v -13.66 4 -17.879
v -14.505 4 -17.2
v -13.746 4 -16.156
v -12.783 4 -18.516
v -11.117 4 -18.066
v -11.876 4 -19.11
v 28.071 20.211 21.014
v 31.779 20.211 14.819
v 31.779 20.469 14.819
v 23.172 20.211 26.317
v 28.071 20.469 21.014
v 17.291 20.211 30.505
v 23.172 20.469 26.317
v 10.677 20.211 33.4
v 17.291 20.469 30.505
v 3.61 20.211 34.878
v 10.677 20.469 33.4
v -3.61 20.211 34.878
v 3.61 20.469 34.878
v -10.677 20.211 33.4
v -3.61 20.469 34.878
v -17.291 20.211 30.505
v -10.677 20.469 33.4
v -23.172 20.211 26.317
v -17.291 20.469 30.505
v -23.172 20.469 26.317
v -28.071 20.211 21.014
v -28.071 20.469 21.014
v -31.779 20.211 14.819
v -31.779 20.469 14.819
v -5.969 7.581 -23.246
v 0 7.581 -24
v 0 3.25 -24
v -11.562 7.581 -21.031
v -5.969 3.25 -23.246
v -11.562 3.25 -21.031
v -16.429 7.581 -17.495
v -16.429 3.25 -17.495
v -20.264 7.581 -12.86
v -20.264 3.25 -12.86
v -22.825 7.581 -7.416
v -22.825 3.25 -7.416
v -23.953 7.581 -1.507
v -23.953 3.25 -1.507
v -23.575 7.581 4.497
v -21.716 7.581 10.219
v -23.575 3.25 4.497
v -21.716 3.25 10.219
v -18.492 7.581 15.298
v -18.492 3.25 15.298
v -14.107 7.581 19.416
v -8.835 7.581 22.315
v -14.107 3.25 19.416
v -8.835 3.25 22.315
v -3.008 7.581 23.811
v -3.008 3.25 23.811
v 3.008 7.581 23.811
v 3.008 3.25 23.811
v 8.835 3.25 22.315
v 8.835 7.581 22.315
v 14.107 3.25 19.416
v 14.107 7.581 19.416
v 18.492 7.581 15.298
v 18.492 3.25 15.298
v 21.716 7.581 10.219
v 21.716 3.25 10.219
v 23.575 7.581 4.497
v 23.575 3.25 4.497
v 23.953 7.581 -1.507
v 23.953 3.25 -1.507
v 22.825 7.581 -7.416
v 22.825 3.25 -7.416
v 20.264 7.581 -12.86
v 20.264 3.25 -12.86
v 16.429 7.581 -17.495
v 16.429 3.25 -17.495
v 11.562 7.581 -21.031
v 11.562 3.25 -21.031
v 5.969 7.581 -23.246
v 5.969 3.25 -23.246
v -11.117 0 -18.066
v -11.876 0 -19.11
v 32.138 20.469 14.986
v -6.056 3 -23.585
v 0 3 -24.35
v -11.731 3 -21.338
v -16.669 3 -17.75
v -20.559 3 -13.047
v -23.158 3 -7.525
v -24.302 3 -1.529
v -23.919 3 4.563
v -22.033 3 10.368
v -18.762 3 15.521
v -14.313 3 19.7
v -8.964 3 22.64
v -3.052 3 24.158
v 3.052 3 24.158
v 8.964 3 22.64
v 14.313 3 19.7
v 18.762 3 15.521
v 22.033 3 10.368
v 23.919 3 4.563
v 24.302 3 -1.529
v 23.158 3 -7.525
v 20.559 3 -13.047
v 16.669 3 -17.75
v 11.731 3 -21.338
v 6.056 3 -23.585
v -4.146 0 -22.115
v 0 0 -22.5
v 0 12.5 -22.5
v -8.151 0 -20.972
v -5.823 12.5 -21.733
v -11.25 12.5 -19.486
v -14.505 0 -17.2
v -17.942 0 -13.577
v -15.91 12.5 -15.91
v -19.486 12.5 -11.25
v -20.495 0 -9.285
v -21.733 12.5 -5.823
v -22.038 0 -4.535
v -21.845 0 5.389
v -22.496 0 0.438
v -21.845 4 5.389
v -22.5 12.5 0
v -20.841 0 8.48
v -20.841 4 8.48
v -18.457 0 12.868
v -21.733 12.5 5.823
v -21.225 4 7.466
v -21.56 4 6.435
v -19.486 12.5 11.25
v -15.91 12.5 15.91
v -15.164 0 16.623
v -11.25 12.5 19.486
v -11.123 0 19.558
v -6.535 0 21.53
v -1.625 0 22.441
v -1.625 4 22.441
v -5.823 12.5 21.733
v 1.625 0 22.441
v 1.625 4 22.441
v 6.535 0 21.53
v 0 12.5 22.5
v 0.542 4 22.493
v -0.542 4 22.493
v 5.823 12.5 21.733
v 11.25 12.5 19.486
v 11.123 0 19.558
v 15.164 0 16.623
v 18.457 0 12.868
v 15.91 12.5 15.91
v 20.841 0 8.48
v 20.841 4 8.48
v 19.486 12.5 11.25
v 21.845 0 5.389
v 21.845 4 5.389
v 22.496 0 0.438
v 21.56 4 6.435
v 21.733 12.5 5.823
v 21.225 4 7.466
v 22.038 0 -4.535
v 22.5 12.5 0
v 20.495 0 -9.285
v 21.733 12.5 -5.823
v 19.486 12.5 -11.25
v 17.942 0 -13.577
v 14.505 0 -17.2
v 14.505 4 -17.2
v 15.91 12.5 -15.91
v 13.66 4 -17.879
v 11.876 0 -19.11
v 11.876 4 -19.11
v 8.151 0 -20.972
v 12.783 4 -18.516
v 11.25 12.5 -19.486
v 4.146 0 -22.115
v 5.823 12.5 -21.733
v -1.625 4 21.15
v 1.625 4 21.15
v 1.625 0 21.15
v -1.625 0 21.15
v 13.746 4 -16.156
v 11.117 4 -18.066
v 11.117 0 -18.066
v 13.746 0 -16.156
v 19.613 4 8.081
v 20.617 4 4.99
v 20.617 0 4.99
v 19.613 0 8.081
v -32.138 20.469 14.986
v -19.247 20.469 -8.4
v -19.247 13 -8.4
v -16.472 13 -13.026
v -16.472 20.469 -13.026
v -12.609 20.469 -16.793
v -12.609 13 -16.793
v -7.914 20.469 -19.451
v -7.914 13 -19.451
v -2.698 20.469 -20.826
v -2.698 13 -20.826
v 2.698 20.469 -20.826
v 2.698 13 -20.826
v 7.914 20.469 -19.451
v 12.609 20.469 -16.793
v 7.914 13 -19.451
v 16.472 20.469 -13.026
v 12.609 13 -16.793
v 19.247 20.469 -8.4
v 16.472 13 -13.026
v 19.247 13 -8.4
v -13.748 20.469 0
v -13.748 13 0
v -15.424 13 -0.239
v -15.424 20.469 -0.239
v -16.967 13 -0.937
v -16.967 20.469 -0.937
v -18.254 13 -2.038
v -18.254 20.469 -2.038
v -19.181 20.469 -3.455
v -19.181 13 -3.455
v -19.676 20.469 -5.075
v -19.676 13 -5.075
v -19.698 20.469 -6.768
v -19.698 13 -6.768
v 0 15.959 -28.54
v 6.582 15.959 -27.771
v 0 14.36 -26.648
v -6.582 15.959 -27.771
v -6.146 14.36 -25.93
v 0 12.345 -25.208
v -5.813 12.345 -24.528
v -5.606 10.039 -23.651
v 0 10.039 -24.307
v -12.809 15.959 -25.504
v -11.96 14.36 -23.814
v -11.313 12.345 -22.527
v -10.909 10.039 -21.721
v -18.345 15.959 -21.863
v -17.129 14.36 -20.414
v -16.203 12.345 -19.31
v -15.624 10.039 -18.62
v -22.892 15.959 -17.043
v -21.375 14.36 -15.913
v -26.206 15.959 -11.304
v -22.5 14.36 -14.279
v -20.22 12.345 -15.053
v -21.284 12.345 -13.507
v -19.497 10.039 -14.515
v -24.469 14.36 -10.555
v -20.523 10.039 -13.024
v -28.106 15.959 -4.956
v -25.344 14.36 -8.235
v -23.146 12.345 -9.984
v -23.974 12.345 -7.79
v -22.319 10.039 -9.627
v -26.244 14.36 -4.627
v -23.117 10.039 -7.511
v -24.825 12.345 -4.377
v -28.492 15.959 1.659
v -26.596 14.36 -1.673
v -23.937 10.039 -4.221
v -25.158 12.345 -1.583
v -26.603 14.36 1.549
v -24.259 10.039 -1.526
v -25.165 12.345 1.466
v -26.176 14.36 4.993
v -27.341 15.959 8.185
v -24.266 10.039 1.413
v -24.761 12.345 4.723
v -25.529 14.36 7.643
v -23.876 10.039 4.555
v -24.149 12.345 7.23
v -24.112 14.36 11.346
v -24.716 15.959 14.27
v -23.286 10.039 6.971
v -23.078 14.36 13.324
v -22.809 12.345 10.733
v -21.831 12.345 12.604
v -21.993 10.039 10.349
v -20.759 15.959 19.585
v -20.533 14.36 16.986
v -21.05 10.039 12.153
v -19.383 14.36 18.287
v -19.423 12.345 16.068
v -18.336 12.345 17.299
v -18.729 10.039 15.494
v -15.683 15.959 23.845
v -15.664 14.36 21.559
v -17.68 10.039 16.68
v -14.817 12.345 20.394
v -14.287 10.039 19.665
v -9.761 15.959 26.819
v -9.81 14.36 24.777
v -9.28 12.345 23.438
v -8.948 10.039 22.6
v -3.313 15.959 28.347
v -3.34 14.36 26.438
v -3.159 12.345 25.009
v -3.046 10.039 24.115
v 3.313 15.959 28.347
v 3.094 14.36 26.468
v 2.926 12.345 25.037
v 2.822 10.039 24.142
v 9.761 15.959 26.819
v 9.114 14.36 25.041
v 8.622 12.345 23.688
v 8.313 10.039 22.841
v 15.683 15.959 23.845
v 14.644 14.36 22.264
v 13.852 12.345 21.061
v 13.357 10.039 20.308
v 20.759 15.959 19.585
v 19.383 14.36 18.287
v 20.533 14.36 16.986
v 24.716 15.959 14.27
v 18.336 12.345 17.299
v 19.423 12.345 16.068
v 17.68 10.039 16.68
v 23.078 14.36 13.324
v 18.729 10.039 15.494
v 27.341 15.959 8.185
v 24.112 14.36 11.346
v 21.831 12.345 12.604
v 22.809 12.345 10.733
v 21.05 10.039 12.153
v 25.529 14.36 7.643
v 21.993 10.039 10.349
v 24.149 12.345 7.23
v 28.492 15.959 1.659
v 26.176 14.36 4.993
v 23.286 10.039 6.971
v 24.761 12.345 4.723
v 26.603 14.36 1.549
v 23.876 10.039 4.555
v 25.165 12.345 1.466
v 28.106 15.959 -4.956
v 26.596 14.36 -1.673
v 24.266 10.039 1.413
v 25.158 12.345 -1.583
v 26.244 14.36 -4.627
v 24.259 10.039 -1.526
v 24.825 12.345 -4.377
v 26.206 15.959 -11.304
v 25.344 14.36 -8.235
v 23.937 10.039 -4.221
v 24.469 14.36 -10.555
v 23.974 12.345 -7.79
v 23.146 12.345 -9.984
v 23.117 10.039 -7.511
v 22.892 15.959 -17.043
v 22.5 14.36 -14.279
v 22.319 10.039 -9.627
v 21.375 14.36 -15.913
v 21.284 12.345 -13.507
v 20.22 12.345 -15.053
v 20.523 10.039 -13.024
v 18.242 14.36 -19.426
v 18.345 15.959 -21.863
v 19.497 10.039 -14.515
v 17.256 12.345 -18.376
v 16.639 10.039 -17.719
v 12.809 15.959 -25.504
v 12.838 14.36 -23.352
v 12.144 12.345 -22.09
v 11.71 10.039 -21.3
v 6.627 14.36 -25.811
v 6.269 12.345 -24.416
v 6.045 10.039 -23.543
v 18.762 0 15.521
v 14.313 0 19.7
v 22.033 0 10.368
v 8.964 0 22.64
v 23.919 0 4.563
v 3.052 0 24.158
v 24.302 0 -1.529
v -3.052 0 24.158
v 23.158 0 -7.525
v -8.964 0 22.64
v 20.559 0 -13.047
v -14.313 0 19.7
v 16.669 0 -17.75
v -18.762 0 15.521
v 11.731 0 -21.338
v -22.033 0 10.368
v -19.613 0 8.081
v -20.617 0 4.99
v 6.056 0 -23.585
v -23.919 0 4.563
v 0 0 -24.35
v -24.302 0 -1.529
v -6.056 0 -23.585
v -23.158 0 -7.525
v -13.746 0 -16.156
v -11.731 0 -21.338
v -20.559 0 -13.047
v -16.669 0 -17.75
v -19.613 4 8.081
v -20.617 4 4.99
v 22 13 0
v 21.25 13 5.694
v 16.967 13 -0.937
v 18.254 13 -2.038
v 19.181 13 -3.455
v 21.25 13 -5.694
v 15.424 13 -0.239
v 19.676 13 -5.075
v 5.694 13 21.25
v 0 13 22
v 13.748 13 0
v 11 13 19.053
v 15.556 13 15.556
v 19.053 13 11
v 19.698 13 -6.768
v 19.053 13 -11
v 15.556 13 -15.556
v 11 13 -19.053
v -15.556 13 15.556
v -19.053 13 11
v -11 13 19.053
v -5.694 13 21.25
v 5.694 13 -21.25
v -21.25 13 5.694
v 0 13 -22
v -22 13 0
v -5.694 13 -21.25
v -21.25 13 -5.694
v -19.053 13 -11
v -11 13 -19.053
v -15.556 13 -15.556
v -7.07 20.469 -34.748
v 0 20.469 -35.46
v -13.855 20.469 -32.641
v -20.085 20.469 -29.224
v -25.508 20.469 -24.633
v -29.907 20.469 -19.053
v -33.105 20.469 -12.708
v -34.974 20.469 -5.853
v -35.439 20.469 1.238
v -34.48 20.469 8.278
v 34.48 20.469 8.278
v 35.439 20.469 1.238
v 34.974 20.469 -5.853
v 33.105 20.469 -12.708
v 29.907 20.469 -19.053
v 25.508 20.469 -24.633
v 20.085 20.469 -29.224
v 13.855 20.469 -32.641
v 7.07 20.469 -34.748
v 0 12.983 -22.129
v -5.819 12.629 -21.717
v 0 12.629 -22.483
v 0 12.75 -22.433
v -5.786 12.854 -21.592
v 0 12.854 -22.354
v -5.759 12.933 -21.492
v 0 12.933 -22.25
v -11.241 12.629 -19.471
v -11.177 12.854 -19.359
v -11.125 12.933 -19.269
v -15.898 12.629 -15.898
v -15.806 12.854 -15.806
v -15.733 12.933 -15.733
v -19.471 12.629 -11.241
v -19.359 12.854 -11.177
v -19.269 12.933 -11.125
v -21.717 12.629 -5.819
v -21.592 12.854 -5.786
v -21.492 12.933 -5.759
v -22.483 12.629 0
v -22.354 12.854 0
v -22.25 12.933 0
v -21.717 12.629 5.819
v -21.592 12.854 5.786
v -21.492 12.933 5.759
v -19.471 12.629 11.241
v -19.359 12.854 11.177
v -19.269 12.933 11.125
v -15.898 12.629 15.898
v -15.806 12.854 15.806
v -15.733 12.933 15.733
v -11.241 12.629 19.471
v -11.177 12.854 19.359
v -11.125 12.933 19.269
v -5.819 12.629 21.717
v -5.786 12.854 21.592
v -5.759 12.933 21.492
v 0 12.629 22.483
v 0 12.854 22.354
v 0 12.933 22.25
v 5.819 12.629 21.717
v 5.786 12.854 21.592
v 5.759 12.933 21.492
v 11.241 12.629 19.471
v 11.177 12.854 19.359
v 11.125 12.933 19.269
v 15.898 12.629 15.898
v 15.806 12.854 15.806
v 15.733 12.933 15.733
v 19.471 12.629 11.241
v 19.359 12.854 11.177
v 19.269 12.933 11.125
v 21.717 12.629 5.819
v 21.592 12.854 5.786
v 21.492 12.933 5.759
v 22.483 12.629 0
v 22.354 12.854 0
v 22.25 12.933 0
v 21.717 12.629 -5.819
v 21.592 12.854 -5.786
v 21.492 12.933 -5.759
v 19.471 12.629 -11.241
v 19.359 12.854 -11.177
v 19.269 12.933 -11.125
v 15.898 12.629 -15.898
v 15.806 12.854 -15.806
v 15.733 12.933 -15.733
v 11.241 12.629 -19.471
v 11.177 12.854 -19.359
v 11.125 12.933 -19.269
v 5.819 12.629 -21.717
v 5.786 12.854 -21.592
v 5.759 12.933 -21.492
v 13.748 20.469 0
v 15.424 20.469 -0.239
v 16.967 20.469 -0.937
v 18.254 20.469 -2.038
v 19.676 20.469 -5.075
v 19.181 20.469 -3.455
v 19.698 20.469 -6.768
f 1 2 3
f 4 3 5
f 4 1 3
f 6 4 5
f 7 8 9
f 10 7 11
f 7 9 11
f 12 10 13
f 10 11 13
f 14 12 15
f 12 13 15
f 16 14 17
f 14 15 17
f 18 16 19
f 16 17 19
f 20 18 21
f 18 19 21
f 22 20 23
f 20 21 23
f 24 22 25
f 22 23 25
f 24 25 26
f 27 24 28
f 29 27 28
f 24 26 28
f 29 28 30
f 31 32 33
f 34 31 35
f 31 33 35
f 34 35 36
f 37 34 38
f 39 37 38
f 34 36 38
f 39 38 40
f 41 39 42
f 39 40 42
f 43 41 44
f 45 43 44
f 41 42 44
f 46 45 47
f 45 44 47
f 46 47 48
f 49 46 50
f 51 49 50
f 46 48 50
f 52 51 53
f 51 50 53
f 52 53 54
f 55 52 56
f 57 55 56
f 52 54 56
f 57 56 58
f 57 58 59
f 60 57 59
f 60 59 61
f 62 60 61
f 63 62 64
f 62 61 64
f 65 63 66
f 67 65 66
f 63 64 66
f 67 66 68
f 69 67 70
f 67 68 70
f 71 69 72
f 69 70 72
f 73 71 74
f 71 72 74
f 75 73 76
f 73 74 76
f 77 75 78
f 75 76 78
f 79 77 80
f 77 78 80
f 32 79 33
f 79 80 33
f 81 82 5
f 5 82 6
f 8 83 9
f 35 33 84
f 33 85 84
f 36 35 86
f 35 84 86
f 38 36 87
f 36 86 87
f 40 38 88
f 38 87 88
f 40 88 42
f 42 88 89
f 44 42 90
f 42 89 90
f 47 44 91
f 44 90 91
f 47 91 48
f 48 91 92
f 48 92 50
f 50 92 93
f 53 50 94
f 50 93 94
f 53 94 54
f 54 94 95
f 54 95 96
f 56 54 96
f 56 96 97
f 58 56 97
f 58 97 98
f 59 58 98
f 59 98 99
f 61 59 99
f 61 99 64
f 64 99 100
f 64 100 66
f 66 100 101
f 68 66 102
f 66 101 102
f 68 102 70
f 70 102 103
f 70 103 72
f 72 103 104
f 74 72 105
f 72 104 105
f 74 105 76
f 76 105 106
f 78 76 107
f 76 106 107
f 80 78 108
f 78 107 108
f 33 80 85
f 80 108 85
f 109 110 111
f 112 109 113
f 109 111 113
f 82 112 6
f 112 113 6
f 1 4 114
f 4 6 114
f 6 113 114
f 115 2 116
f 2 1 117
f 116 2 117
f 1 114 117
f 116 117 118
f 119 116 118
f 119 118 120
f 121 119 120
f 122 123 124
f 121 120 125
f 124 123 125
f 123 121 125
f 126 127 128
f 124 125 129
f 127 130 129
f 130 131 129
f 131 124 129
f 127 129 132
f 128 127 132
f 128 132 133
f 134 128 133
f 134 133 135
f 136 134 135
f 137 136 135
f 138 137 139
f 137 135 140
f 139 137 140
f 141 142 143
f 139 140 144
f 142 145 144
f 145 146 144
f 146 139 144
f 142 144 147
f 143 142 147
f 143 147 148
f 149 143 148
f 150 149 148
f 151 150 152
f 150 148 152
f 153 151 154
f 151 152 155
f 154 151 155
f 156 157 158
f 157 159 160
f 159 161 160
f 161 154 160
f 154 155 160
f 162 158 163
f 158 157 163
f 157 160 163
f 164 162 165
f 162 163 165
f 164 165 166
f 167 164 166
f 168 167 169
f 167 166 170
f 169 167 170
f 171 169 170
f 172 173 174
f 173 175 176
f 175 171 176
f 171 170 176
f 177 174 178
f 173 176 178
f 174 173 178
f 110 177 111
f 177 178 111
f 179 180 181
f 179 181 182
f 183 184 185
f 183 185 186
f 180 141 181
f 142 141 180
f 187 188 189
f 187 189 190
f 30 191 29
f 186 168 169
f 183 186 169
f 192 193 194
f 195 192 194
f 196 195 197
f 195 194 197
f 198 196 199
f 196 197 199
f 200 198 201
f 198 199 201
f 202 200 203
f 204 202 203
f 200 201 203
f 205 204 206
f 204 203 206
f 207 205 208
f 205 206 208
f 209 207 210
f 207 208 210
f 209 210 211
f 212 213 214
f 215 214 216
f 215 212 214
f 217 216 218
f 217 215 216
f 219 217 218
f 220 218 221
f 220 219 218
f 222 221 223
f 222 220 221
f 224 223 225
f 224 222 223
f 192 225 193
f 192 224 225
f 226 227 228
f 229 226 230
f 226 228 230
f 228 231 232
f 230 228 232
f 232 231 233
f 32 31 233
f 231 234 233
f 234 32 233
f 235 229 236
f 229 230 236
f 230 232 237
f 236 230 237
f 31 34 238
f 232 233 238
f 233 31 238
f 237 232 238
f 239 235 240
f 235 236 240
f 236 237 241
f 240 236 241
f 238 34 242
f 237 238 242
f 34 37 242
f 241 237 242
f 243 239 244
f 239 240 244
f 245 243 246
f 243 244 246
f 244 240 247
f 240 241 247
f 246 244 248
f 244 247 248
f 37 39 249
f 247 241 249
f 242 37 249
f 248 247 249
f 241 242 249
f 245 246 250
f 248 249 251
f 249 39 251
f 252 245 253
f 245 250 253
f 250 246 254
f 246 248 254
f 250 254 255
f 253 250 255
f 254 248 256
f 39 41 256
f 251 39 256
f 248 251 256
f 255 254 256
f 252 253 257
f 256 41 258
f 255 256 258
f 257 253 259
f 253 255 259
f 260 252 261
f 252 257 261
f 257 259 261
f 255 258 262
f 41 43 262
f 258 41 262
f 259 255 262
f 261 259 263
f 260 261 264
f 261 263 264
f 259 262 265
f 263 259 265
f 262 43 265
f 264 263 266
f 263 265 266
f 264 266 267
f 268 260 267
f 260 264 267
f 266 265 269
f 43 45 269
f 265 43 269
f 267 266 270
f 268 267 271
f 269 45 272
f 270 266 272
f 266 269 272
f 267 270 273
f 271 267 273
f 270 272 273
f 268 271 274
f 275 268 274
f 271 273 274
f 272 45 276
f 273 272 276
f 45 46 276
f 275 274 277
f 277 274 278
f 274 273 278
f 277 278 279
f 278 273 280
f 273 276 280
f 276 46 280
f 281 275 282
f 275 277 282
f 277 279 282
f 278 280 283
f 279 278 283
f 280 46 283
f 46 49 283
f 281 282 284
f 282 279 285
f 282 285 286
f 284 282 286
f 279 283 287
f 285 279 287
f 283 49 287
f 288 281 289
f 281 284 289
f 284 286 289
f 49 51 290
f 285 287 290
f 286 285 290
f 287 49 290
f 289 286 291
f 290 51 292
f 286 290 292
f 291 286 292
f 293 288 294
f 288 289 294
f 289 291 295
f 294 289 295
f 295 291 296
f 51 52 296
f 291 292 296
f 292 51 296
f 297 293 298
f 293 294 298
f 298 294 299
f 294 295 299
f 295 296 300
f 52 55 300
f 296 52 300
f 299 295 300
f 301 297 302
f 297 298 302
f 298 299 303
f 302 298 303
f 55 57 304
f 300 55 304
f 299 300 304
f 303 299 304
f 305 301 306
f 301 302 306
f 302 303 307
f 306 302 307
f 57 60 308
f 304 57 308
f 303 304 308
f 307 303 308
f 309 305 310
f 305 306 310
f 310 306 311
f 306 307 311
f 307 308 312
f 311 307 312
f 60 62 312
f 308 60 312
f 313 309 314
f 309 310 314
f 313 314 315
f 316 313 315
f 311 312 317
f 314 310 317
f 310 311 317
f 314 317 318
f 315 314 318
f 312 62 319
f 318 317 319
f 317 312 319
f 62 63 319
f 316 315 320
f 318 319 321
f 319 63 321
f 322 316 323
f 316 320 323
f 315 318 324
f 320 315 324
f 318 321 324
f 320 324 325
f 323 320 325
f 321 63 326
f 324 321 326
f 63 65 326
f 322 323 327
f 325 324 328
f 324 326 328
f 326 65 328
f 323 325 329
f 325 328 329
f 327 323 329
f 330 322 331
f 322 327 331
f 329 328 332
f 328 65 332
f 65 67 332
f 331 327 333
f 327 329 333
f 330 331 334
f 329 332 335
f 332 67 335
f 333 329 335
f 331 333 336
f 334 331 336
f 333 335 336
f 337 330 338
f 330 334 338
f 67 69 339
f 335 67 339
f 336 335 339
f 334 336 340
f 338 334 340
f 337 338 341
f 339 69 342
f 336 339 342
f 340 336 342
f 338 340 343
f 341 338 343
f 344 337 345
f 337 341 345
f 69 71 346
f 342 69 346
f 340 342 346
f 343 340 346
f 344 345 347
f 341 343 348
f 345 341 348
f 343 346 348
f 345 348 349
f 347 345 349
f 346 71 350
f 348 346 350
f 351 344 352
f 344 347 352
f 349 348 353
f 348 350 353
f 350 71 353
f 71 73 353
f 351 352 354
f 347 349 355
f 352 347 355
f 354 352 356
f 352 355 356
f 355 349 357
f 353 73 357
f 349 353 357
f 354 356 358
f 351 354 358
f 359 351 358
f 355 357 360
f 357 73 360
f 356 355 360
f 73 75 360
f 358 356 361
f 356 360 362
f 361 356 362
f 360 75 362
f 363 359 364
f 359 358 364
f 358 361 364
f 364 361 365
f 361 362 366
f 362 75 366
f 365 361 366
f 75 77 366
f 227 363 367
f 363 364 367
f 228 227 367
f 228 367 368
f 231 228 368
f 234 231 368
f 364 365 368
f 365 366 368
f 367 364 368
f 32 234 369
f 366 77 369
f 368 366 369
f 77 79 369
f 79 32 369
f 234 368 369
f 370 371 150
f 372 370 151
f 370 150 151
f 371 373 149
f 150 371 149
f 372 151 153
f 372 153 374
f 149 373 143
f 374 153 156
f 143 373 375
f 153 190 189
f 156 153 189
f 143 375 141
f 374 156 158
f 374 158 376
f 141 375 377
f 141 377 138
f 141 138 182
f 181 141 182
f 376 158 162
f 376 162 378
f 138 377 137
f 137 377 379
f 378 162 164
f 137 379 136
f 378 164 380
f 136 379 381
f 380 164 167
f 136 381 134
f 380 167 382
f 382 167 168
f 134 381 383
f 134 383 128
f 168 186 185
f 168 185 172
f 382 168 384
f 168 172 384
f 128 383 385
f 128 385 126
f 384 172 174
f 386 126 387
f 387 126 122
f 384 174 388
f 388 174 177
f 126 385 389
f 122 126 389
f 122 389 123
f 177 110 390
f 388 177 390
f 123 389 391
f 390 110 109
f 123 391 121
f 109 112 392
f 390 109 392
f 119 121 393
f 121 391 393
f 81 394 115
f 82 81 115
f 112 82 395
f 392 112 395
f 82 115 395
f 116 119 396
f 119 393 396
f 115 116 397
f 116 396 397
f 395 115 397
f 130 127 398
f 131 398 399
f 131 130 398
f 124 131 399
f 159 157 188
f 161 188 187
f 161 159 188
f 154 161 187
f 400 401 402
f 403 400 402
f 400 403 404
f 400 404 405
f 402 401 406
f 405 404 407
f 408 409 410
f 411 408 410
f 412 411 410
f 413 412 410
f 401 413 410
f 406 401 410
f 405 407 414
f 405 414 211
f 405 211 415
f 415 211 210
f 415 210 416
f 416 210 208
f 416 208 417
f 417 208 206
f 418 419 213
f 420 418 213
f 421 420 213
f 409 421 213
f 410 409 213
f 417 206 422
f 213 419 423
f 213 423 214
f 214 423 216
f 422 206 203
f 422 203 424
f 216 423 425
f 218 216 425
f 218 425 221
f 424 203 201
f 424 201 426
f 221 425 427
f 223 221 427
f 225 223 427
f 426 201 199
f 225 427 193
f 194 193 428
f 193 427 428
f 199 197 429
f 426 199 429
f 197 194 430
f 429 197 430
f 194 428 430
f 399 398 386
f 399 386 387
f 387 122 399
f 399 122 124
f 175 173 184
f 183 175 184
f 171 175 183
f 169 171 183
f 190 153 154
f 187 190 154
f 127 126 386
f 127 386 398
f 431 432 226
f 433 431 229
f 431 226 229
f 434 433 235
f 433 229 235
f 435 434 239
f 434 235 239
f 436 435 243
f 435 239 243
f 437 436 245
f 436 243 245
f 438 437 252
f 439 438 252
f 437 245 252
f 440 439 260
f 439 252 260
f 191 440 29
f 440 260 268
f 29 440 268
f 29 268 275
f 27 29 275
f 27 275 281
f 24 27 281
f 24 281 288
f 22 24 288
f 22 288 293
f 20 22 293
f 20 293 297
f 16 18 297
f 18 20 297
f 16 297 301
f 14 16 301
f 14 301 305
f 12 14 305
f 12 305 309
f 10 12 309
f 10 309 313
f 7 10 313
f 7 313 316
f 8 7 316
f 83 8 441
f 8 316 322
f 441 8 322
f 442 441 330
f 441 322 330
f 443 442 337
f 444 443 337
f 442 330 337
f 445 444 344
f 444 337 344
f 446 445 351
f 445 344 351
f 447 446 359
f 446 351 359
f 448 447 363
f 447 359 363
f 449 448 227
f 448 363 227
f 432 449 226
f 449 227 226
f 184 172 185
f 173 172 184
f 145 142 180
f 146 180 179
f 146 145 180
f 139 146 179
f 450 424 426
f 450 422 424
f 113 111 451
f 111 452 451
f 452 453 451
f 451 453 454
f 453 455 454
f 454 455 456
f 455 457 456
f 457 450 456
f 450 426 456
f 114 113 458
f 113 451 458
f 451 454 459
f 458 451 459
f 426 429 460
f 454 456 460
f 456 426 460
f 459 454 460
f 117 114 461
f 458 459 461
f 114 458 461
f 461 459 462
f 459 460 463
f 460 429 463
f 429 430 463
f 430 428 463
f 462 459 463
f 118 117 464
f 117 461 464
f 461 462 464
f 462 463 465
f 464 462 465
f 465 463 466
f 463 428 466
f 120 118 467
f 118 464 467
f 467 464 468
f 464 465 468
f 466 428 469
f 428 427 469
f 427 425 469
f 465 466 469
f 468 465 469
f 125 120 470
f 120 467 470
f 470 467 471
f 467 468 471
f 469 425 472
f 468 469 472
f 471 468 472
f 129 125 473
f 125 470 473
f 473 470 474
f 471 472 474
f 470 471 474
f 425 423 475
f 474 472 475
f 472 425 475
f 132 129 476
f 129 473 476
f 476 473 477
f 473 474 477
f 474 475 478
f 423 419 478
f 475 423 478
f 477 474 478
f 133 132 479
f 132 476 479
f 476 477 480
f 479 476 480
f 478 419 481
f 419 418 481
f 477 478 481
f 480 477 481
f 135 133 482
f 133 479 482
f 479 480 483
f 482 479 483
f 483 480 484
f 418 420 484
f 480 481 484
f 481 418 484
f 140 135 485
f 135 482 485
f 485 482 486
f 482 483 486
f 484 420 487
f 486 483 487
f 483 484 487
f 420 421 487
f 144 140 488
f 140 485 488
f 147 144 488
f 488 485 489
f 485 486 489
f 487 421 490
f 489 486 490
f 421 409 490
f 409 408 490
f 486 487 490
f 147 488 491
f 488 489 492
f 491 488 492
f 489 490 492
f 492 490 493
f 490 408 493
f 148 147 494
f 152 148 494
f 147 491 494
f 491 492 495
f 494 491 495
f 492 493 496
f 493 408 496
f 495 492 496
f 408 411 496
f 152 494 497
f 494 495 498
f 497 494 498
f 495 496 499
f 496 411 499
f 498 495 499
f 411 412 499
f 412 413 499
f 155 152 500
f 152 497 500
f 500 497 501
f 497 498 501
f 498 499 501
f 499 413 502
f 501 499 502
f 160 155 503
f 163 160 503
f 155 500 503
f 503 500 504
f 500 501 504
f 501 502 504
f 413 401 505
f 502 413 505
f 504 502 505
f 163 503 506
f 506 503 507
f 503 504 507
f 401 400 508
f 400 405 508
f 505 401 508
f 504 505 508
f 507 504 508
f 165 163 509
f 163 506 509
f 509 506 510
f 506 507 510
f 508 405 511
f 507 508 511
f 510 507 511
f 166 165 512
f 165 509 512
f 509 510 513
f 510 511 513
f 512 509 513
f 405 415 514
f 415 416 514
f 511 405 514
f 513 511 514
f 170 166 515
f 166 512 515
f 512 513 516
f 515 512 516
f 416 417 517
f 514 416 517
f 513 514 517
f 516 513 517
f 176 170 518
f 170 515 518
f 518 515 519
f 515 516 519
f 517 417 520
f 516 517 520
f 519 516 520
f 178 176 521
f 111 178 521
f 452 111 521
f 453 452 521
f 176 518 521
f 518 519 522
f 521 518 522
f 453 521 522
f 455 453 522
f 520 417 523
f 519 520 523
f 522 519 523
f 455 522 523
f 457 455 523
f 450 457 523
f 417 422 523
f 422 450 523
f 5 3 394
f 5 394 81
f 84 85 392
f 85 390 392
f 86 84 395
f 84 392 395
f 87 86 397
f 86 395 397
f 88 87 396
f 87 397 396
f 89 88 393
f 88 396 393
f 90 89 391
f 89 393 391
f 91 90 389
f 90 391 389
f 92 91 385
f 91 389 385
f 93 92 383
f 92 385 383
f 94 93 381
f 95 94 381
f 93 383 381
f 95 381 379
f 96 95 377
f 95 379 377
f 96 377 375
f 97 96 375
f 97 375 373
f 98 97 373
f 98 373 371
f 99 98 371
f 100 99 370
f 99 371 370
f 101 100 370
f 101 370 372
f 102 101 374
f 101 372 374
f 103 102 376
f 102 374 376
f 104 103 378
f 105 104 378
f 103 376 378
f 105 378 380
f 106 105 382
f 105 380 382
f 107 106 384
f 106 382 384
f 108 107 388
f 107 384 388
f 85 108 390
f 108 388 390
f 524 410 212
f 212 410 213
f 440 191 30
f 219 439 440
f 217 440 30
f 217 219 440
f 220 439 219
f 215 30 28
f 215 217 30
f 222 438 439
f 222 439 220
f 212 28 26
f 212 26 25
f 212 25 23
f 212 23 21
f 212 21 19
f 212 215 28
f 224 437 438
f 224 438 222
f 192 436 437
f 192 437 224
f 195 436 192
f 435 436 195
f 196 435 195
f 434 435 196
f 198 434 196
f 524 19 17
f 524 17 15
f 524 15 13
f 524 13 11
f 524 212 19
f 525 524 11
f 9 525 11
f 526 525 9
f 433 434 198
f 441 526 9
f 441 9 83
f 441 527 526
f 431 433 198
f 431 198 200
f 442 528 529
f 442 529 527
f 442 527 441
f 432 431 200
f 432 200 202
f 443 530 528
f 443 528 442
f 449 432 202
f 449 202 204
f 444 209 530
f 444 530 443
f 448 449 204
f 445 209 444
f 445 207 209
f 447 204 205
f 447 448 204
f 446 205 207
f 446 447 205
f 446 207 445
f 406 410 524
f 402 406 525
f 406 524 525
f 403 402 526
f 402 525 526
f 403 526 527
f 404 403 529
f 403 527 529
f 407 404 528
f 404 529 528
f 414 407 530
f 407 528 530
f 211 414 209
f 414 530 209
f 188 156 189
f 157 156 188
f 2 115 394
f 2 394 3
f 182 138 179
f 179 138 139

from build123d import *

# Parameters (mm, degrees)
CUT_EXTRUDE3_DEPTH           = 60
CUT_EXTRUDE5_DEPTH           = 2
CUT_EXTRUDE5_DEPTH_BACK      = 30
SKETCH9_R                    = 38
SKETCH9_R_2                  = 23
SKETCH19_W                   = 12
SKETCH19_H                   = 36.5
CUT_REVOLVE2_ANGLE           = 65
CUT_REVOLVE2_OTHER_WAY_ANGLE = 65
SKETCH21_W                   = 3.25
SKETCH21_H                   = 4
BOSS_EXTRUDE3_DEPTH          = 1.35
CIRPATTERN1_COUNT            = 5
CUT_EXTRUDE9_START           = -5
CUT_EXTRUDE9_DEPTH           = 5
SKETCH23_R                   = 10.5
CUT_EXTRUDE10_DEPTH          = 10
SKETCH24_W                   = 17
SKETCH24_H                   = 12
BOSS_EXTRUDE4_DEPTH          = 8
SKETCH26_W                   = 12
SKETCH26_H                   = 8
CUT_EXTRUDE11_DEPTH          = 10
SKETCH27_W                   = 4
SKETCH27_H                   = 5
CUT_EXTRUDE12_DEPTH          = 5
CUT_EXTRUDE14_DEPTH          = 2
CUT_EXTRUDE14_DEPTH_BACK     = 30
SKETCH29_R                   = 1
CUT_EXTRUDE15_DEPTH          = 15
FILLET1_R                    = 6
FILLET2_R                    = 8
SKETCH30_W                   = 97.703590575
SKETCH30_H                   = 5
CUT_EXTRUDE16_DEPTH          = 5
INTERSECT1_START             = 20.469057744
INTERSECT1_DEPTH             = 42.958818353


# Read off the part's stored shape, not the designer's step: Cut-Extrude9, Intersect1
with BuildPart() as part:
    # Sketch1 → Revolve1 (revolve)
    with BuildSketch(Plane.XY, mode=Mode.PRIVATE) as revolve1_sk:
        with BuildLine():
            Line((0, 63.427876097), (32, 63.427876097))
            ThreePointArc((32, 63.427876097), (37.656854249, 61.084730346), (40, 55.427876097))
            Line((40, 55.427876097), (40, 28.846818009))
            ThreePointArc((40, 28.846818009), (38.792081772, 24.082439968), (35.460140376, 20.469057744))
            Line((35.460140376, 20.469057744), (28.539859624, 15.958818353))
            ThreePointArc((28.539859624, 15.958818353), (25.207918228, 12.345436129), (24, 7.581058088))
            Line((24, 7.581058088), (24, 3.25))
            Line((24, 3.25), (24.35, 3))
            Line((24.35, 3), (24.35, 0))
            Line((24.35, 0), (22.5, 0))
            Line((22.5, 0), (22.5, 12.5))
            ThreePointArc((22.5, 12.5), (22.353553391, 12.853553391), (22, 13))
            Line((22, 13), (0, 13))
            Line((0, 13), (0, 63.427876097))
        make_face()
    revolve(revolve1_sk.sketch.rotate(Axis((0, 0, 0), (0, 1, 0)), 90), axis=Axis((0, 0, 0), (0, 1, 0)))

    # Sketch11 → Cut-Extrude3 (cut)
    with BuildSketch(Plane(origin=(0, 13, 0), x_dir=(-1, 0, 0), z_dir=(0, -1, 0))):
        with BuildLine():
            Line((-21, 0), (21, 0))
            ThreePointArc((21, 0), (0, 21), (-21, 0))
        make_face()
    extrude(amount=-CUT_EXTRUDE3_DEPTH, mode=Mode.SUBTRACT)

    # Sketch9 → Cut-Extrude5 (cut, two sides: drawn at the far end of the back side and taken through both)
    with BuildSketch(Plane(origin=(0, 55.427876097, 0), x_dir=(1, 0, 0), z_dir=(0, 1, 0)).offset(-CUT_EXTRUDE5_DEPTH_BACK)):
        with Locations(Location((0, 0, 0), (0, 0, 270))):
            Circle(SKETCH9_R)
        with Locations(Location((0, 0, 0), (0, 0, 270))):
            Circle(SKETCH9_R_2, mode=Mode.SUBTRACT)
    extrude(amount=CUT_EXTRUDE5_DEPTH + CUT_EXTRUDE5_DEPTH_BACK, mode=Mode.SUBTRACT)

    # Sketch19 → Cut-Revolve2 (revolve, cut)
    with BuildSketch(Plane(origin=(0, 0, 0), x_dir=(0, 0, -1), z_dir=(1, 0, 0))):
        with Locations((-41.064715832, 37.177876097)):
            Rectangle(SKETCH19_W, SKETCH19_H)
    revolve(axis=Axis((0, 0, 0), (0, 1, 0)), revolution_arc=CUT_REVOLVE2_ANGLE, mode=Mode.SUBTRACT)

    # Sketch19 → Cut-Revolve2 other way (revolve, cut)
    with BuildSketch(Plane(origin=(0, 0, 0), x_dir=(0, 0, -1), z_dir=(1, 0, 0))):
        with Locations((-41.064715832, 37.177876097)):
            Rectangle(SKETCH19_W, SKETCH19_H)
    revolve(axis=Axis((0, 0, 0), (0, -1, 0)), revolution_arc=CUT_REVOLVE2_OTHER_WAY_ANGLE, mode=Mode.SUBTRACT)

    # Sketch21 → Boss-Extrude3 (add)
    with BuildSketch(Plane(origin=(0, 0, 22.5), x_dir=(-1, 0, 0), z_dir=(0, 0, -1))):
        with Locations((0, 2)):
            Rectangle(SKETCH21_W, SKETCH21_H)
    boss_extrude3 = extrude(amount=BOSS_EXTRUDE3_DEPTH)

    # CirPattern1: Boss-Extrude3 ×5 about axis
    cirpattern1_axis = Axis((0, 0, 0), (0, 1, 0))
    for i in range(1, CIRPATTERN1_COUNT):
        add(boss_extrude3.rotate(cirpattern1_axis, i * 360 / CIRPATTERN1_COUNT))

    # Cut-Extrude9 outline → Cut-Extrude9 (cut)
    with BuildSketch(Plane(origin=(0, 63.427876097, 0), x_dir=(1, 0, 0), z_dir=(0, 1, 0)).offset(CUT_EXTRUDE9_START)):
        with BuildLine():
            ThreePointArc((40, 0), (0, 40), (-40, 0))
            Line((-40, 0), (-21, 0))
            ThreePointArc((-21, 0), (0, 21), (21, 0))
            Line((21, 0), (40, 0))
        make_face()
    extrude(amount=CUT_EXTRUDE9_DEPTH, mode=Mode.SUBTRACT)

    # Sketch23 → Cut-Extrude10 (cut)
    with BuildSketch(Plane(origin=(0, 0, -40), x_dir=(-1, 0, 0), z_dir=(0, 0, -1))):
        with Locations((0, 42.137876097)):
            Circle(SKETCH23_R)
    extrude(amount=-CUT_EXTRUDE10_DEPTH, mode=Mode.SUBTRACT)

    # Sketch24 → Boss-Extrude4 (add)
    with BuildSketch(Plane(origin=(0, 58.427876097, 0), x_dir=(1, 0, 0), z_dir=(0, 1, 0))):
        with Locations((0, 30)):
            Rectangle(SKETCH24_W, SKETCH24_H)
    extrude(amount=-BOSS_EXTRUDE4_DEPTH)

    # Sketch26 → Cut-Extrude11 (cut)
    with BuildSketch(Plane(origin=(0, 58.427876097, 0), x_dir=(1, 0, 0), z_dir=(0, 1, 0))):
        with Locations((0, 30)):
            Rectangle(SKETCH26_W, SKETCH26_H)
    extrude(amount=-CUT_EXTRUDE11_DEPTH, mode=Mode.SUBTRACT)

    # Sketch27 → Cut-Extrude12 (cut)
    with BuildSketch(Plane(origin=(8.5, 0, 0), x_dir=(0, 0, -1), z_dir=(1, 0, 0))):
        with Locations((29.5, 53.927876097)):
            Rectangle(SKETCH27_W, SKETCH27_H)
    extrude(amount=-CUT_EXTRUDE12_DEPTH, mode=Mode.SUBTRACT)

    # Sketch28 → Cut-Extrude14 (cut, two sides: drawn at the far end of the back side and taken through both)
    with BuildSketch(Plane(origin=(0, 55.427876097, 0), x_dir=(1, 0, 0), z_dir=(0, 1, 0)).offset(-CUT_EXTRUDE14_DEPTH_BACK)):
        with BuildLine():
            Line((-22.912878475, -2), (22.912878475, -2))
            ThreePointArc((22.912878475, -2), (0, -23), (-22.912878475, -2))
        make_face()
    extrude(amount=CUT_EXTRUDE14_DEPTH + CUT_EXTRUDE14_DEPTH_BACK, mode=Mode.SUBTRACT)

    # Sketch29 → Cut-Extrude15 (cut)
    with BuildSketch(Plane(origin=(0, 0, 0), x_dir=(-1, 0, 0), z_dir=(0, 0, -1))):
        with Locations((-30.416198487, 60.927876097)):
            Circle(SKETCH29_R)
        with Locations((30.416198487, 60.927876097)):
            Circle(SKETCH29_R)
        with Locations((0, 60.927876097)):
            Circle(SKETCH29_R)
    extrude(amount=-CUT_EXTRUDE15_DEPTH, mode=Mode.SUBTRACT)

    # Fillet1
    fillet1_edges = [part.edges().sort_by_distance(p)[0] for p in [
        (21, 35.713938048, 0),
        (-21, 35.713938048, 0),
    ]]
    fillet(fillet1_edges, radius=FILLET1_R)

    # Fillet2
    fillet2_edges = [part.edges().sort_by_distance(p)[0] for p in [
        (-22.912878475, 41.427876097, 2),
        (22.912878475, 41.427876097, 2),
    ]]
    fillet(fillet2_edges, radius=FILLET2_R)

    # Sketch30 → Cut-Extrude16 (cut)
    with BuildSketch(Plane(origin=(0, 63.427876097, 0), x_dir=(1, 0, 0), z_dir=(0, 1, 0))):
        with Locations((-0.528699084, -2.5)):
            Rectangle(SKETCH30_W, SKETCH30_H)
    extrude(amount=-CUT_EXTRUDE16_DEPTH, mode=Mode.SUBTRACT)

    # Intersect1 outline → Intersect1 (cut)
    with BuildSketch(Plane(origin=(0, 0, 0), x_dir=(1, 0, 0), z_dir=(0, 1, 0)).offset(INTERSECT1_START)):
        with BuildLine():
            Line((-37.080992435, -15), (-42, -15))
            Line((-42, -15), (-42, -42))
            Line((-42, -42), (42, -42))
            Line((42, -42), (42, -15))
            Line((42, -15), (37.080992435, -15))
            ThreePointArc((37.080992435, -15), (0, 40), (-37.080992435, -15))
        make_face()
        with BuildLine():
            Line((13.747727085, 0), (-13.747727085, 0))
            ThreePointArc((-13.747727085, 0), (-18.767687244, 2.713664655), (-19.246817919, 8.4))
            ThreePointArc((-19.246817919, 8.4), (0, 21), (19.246817919, 8.4))
            ThreePointArc((19.246817919, 8.4), (18.767687244, 2.713664655), (13.747727085, 0))
        make_face(mode=Mode.SUBTRACT)
    extrude(amount=INTERSECT1_DEPTH, mode=Mode.SUBTRACT)


solid = part.part
